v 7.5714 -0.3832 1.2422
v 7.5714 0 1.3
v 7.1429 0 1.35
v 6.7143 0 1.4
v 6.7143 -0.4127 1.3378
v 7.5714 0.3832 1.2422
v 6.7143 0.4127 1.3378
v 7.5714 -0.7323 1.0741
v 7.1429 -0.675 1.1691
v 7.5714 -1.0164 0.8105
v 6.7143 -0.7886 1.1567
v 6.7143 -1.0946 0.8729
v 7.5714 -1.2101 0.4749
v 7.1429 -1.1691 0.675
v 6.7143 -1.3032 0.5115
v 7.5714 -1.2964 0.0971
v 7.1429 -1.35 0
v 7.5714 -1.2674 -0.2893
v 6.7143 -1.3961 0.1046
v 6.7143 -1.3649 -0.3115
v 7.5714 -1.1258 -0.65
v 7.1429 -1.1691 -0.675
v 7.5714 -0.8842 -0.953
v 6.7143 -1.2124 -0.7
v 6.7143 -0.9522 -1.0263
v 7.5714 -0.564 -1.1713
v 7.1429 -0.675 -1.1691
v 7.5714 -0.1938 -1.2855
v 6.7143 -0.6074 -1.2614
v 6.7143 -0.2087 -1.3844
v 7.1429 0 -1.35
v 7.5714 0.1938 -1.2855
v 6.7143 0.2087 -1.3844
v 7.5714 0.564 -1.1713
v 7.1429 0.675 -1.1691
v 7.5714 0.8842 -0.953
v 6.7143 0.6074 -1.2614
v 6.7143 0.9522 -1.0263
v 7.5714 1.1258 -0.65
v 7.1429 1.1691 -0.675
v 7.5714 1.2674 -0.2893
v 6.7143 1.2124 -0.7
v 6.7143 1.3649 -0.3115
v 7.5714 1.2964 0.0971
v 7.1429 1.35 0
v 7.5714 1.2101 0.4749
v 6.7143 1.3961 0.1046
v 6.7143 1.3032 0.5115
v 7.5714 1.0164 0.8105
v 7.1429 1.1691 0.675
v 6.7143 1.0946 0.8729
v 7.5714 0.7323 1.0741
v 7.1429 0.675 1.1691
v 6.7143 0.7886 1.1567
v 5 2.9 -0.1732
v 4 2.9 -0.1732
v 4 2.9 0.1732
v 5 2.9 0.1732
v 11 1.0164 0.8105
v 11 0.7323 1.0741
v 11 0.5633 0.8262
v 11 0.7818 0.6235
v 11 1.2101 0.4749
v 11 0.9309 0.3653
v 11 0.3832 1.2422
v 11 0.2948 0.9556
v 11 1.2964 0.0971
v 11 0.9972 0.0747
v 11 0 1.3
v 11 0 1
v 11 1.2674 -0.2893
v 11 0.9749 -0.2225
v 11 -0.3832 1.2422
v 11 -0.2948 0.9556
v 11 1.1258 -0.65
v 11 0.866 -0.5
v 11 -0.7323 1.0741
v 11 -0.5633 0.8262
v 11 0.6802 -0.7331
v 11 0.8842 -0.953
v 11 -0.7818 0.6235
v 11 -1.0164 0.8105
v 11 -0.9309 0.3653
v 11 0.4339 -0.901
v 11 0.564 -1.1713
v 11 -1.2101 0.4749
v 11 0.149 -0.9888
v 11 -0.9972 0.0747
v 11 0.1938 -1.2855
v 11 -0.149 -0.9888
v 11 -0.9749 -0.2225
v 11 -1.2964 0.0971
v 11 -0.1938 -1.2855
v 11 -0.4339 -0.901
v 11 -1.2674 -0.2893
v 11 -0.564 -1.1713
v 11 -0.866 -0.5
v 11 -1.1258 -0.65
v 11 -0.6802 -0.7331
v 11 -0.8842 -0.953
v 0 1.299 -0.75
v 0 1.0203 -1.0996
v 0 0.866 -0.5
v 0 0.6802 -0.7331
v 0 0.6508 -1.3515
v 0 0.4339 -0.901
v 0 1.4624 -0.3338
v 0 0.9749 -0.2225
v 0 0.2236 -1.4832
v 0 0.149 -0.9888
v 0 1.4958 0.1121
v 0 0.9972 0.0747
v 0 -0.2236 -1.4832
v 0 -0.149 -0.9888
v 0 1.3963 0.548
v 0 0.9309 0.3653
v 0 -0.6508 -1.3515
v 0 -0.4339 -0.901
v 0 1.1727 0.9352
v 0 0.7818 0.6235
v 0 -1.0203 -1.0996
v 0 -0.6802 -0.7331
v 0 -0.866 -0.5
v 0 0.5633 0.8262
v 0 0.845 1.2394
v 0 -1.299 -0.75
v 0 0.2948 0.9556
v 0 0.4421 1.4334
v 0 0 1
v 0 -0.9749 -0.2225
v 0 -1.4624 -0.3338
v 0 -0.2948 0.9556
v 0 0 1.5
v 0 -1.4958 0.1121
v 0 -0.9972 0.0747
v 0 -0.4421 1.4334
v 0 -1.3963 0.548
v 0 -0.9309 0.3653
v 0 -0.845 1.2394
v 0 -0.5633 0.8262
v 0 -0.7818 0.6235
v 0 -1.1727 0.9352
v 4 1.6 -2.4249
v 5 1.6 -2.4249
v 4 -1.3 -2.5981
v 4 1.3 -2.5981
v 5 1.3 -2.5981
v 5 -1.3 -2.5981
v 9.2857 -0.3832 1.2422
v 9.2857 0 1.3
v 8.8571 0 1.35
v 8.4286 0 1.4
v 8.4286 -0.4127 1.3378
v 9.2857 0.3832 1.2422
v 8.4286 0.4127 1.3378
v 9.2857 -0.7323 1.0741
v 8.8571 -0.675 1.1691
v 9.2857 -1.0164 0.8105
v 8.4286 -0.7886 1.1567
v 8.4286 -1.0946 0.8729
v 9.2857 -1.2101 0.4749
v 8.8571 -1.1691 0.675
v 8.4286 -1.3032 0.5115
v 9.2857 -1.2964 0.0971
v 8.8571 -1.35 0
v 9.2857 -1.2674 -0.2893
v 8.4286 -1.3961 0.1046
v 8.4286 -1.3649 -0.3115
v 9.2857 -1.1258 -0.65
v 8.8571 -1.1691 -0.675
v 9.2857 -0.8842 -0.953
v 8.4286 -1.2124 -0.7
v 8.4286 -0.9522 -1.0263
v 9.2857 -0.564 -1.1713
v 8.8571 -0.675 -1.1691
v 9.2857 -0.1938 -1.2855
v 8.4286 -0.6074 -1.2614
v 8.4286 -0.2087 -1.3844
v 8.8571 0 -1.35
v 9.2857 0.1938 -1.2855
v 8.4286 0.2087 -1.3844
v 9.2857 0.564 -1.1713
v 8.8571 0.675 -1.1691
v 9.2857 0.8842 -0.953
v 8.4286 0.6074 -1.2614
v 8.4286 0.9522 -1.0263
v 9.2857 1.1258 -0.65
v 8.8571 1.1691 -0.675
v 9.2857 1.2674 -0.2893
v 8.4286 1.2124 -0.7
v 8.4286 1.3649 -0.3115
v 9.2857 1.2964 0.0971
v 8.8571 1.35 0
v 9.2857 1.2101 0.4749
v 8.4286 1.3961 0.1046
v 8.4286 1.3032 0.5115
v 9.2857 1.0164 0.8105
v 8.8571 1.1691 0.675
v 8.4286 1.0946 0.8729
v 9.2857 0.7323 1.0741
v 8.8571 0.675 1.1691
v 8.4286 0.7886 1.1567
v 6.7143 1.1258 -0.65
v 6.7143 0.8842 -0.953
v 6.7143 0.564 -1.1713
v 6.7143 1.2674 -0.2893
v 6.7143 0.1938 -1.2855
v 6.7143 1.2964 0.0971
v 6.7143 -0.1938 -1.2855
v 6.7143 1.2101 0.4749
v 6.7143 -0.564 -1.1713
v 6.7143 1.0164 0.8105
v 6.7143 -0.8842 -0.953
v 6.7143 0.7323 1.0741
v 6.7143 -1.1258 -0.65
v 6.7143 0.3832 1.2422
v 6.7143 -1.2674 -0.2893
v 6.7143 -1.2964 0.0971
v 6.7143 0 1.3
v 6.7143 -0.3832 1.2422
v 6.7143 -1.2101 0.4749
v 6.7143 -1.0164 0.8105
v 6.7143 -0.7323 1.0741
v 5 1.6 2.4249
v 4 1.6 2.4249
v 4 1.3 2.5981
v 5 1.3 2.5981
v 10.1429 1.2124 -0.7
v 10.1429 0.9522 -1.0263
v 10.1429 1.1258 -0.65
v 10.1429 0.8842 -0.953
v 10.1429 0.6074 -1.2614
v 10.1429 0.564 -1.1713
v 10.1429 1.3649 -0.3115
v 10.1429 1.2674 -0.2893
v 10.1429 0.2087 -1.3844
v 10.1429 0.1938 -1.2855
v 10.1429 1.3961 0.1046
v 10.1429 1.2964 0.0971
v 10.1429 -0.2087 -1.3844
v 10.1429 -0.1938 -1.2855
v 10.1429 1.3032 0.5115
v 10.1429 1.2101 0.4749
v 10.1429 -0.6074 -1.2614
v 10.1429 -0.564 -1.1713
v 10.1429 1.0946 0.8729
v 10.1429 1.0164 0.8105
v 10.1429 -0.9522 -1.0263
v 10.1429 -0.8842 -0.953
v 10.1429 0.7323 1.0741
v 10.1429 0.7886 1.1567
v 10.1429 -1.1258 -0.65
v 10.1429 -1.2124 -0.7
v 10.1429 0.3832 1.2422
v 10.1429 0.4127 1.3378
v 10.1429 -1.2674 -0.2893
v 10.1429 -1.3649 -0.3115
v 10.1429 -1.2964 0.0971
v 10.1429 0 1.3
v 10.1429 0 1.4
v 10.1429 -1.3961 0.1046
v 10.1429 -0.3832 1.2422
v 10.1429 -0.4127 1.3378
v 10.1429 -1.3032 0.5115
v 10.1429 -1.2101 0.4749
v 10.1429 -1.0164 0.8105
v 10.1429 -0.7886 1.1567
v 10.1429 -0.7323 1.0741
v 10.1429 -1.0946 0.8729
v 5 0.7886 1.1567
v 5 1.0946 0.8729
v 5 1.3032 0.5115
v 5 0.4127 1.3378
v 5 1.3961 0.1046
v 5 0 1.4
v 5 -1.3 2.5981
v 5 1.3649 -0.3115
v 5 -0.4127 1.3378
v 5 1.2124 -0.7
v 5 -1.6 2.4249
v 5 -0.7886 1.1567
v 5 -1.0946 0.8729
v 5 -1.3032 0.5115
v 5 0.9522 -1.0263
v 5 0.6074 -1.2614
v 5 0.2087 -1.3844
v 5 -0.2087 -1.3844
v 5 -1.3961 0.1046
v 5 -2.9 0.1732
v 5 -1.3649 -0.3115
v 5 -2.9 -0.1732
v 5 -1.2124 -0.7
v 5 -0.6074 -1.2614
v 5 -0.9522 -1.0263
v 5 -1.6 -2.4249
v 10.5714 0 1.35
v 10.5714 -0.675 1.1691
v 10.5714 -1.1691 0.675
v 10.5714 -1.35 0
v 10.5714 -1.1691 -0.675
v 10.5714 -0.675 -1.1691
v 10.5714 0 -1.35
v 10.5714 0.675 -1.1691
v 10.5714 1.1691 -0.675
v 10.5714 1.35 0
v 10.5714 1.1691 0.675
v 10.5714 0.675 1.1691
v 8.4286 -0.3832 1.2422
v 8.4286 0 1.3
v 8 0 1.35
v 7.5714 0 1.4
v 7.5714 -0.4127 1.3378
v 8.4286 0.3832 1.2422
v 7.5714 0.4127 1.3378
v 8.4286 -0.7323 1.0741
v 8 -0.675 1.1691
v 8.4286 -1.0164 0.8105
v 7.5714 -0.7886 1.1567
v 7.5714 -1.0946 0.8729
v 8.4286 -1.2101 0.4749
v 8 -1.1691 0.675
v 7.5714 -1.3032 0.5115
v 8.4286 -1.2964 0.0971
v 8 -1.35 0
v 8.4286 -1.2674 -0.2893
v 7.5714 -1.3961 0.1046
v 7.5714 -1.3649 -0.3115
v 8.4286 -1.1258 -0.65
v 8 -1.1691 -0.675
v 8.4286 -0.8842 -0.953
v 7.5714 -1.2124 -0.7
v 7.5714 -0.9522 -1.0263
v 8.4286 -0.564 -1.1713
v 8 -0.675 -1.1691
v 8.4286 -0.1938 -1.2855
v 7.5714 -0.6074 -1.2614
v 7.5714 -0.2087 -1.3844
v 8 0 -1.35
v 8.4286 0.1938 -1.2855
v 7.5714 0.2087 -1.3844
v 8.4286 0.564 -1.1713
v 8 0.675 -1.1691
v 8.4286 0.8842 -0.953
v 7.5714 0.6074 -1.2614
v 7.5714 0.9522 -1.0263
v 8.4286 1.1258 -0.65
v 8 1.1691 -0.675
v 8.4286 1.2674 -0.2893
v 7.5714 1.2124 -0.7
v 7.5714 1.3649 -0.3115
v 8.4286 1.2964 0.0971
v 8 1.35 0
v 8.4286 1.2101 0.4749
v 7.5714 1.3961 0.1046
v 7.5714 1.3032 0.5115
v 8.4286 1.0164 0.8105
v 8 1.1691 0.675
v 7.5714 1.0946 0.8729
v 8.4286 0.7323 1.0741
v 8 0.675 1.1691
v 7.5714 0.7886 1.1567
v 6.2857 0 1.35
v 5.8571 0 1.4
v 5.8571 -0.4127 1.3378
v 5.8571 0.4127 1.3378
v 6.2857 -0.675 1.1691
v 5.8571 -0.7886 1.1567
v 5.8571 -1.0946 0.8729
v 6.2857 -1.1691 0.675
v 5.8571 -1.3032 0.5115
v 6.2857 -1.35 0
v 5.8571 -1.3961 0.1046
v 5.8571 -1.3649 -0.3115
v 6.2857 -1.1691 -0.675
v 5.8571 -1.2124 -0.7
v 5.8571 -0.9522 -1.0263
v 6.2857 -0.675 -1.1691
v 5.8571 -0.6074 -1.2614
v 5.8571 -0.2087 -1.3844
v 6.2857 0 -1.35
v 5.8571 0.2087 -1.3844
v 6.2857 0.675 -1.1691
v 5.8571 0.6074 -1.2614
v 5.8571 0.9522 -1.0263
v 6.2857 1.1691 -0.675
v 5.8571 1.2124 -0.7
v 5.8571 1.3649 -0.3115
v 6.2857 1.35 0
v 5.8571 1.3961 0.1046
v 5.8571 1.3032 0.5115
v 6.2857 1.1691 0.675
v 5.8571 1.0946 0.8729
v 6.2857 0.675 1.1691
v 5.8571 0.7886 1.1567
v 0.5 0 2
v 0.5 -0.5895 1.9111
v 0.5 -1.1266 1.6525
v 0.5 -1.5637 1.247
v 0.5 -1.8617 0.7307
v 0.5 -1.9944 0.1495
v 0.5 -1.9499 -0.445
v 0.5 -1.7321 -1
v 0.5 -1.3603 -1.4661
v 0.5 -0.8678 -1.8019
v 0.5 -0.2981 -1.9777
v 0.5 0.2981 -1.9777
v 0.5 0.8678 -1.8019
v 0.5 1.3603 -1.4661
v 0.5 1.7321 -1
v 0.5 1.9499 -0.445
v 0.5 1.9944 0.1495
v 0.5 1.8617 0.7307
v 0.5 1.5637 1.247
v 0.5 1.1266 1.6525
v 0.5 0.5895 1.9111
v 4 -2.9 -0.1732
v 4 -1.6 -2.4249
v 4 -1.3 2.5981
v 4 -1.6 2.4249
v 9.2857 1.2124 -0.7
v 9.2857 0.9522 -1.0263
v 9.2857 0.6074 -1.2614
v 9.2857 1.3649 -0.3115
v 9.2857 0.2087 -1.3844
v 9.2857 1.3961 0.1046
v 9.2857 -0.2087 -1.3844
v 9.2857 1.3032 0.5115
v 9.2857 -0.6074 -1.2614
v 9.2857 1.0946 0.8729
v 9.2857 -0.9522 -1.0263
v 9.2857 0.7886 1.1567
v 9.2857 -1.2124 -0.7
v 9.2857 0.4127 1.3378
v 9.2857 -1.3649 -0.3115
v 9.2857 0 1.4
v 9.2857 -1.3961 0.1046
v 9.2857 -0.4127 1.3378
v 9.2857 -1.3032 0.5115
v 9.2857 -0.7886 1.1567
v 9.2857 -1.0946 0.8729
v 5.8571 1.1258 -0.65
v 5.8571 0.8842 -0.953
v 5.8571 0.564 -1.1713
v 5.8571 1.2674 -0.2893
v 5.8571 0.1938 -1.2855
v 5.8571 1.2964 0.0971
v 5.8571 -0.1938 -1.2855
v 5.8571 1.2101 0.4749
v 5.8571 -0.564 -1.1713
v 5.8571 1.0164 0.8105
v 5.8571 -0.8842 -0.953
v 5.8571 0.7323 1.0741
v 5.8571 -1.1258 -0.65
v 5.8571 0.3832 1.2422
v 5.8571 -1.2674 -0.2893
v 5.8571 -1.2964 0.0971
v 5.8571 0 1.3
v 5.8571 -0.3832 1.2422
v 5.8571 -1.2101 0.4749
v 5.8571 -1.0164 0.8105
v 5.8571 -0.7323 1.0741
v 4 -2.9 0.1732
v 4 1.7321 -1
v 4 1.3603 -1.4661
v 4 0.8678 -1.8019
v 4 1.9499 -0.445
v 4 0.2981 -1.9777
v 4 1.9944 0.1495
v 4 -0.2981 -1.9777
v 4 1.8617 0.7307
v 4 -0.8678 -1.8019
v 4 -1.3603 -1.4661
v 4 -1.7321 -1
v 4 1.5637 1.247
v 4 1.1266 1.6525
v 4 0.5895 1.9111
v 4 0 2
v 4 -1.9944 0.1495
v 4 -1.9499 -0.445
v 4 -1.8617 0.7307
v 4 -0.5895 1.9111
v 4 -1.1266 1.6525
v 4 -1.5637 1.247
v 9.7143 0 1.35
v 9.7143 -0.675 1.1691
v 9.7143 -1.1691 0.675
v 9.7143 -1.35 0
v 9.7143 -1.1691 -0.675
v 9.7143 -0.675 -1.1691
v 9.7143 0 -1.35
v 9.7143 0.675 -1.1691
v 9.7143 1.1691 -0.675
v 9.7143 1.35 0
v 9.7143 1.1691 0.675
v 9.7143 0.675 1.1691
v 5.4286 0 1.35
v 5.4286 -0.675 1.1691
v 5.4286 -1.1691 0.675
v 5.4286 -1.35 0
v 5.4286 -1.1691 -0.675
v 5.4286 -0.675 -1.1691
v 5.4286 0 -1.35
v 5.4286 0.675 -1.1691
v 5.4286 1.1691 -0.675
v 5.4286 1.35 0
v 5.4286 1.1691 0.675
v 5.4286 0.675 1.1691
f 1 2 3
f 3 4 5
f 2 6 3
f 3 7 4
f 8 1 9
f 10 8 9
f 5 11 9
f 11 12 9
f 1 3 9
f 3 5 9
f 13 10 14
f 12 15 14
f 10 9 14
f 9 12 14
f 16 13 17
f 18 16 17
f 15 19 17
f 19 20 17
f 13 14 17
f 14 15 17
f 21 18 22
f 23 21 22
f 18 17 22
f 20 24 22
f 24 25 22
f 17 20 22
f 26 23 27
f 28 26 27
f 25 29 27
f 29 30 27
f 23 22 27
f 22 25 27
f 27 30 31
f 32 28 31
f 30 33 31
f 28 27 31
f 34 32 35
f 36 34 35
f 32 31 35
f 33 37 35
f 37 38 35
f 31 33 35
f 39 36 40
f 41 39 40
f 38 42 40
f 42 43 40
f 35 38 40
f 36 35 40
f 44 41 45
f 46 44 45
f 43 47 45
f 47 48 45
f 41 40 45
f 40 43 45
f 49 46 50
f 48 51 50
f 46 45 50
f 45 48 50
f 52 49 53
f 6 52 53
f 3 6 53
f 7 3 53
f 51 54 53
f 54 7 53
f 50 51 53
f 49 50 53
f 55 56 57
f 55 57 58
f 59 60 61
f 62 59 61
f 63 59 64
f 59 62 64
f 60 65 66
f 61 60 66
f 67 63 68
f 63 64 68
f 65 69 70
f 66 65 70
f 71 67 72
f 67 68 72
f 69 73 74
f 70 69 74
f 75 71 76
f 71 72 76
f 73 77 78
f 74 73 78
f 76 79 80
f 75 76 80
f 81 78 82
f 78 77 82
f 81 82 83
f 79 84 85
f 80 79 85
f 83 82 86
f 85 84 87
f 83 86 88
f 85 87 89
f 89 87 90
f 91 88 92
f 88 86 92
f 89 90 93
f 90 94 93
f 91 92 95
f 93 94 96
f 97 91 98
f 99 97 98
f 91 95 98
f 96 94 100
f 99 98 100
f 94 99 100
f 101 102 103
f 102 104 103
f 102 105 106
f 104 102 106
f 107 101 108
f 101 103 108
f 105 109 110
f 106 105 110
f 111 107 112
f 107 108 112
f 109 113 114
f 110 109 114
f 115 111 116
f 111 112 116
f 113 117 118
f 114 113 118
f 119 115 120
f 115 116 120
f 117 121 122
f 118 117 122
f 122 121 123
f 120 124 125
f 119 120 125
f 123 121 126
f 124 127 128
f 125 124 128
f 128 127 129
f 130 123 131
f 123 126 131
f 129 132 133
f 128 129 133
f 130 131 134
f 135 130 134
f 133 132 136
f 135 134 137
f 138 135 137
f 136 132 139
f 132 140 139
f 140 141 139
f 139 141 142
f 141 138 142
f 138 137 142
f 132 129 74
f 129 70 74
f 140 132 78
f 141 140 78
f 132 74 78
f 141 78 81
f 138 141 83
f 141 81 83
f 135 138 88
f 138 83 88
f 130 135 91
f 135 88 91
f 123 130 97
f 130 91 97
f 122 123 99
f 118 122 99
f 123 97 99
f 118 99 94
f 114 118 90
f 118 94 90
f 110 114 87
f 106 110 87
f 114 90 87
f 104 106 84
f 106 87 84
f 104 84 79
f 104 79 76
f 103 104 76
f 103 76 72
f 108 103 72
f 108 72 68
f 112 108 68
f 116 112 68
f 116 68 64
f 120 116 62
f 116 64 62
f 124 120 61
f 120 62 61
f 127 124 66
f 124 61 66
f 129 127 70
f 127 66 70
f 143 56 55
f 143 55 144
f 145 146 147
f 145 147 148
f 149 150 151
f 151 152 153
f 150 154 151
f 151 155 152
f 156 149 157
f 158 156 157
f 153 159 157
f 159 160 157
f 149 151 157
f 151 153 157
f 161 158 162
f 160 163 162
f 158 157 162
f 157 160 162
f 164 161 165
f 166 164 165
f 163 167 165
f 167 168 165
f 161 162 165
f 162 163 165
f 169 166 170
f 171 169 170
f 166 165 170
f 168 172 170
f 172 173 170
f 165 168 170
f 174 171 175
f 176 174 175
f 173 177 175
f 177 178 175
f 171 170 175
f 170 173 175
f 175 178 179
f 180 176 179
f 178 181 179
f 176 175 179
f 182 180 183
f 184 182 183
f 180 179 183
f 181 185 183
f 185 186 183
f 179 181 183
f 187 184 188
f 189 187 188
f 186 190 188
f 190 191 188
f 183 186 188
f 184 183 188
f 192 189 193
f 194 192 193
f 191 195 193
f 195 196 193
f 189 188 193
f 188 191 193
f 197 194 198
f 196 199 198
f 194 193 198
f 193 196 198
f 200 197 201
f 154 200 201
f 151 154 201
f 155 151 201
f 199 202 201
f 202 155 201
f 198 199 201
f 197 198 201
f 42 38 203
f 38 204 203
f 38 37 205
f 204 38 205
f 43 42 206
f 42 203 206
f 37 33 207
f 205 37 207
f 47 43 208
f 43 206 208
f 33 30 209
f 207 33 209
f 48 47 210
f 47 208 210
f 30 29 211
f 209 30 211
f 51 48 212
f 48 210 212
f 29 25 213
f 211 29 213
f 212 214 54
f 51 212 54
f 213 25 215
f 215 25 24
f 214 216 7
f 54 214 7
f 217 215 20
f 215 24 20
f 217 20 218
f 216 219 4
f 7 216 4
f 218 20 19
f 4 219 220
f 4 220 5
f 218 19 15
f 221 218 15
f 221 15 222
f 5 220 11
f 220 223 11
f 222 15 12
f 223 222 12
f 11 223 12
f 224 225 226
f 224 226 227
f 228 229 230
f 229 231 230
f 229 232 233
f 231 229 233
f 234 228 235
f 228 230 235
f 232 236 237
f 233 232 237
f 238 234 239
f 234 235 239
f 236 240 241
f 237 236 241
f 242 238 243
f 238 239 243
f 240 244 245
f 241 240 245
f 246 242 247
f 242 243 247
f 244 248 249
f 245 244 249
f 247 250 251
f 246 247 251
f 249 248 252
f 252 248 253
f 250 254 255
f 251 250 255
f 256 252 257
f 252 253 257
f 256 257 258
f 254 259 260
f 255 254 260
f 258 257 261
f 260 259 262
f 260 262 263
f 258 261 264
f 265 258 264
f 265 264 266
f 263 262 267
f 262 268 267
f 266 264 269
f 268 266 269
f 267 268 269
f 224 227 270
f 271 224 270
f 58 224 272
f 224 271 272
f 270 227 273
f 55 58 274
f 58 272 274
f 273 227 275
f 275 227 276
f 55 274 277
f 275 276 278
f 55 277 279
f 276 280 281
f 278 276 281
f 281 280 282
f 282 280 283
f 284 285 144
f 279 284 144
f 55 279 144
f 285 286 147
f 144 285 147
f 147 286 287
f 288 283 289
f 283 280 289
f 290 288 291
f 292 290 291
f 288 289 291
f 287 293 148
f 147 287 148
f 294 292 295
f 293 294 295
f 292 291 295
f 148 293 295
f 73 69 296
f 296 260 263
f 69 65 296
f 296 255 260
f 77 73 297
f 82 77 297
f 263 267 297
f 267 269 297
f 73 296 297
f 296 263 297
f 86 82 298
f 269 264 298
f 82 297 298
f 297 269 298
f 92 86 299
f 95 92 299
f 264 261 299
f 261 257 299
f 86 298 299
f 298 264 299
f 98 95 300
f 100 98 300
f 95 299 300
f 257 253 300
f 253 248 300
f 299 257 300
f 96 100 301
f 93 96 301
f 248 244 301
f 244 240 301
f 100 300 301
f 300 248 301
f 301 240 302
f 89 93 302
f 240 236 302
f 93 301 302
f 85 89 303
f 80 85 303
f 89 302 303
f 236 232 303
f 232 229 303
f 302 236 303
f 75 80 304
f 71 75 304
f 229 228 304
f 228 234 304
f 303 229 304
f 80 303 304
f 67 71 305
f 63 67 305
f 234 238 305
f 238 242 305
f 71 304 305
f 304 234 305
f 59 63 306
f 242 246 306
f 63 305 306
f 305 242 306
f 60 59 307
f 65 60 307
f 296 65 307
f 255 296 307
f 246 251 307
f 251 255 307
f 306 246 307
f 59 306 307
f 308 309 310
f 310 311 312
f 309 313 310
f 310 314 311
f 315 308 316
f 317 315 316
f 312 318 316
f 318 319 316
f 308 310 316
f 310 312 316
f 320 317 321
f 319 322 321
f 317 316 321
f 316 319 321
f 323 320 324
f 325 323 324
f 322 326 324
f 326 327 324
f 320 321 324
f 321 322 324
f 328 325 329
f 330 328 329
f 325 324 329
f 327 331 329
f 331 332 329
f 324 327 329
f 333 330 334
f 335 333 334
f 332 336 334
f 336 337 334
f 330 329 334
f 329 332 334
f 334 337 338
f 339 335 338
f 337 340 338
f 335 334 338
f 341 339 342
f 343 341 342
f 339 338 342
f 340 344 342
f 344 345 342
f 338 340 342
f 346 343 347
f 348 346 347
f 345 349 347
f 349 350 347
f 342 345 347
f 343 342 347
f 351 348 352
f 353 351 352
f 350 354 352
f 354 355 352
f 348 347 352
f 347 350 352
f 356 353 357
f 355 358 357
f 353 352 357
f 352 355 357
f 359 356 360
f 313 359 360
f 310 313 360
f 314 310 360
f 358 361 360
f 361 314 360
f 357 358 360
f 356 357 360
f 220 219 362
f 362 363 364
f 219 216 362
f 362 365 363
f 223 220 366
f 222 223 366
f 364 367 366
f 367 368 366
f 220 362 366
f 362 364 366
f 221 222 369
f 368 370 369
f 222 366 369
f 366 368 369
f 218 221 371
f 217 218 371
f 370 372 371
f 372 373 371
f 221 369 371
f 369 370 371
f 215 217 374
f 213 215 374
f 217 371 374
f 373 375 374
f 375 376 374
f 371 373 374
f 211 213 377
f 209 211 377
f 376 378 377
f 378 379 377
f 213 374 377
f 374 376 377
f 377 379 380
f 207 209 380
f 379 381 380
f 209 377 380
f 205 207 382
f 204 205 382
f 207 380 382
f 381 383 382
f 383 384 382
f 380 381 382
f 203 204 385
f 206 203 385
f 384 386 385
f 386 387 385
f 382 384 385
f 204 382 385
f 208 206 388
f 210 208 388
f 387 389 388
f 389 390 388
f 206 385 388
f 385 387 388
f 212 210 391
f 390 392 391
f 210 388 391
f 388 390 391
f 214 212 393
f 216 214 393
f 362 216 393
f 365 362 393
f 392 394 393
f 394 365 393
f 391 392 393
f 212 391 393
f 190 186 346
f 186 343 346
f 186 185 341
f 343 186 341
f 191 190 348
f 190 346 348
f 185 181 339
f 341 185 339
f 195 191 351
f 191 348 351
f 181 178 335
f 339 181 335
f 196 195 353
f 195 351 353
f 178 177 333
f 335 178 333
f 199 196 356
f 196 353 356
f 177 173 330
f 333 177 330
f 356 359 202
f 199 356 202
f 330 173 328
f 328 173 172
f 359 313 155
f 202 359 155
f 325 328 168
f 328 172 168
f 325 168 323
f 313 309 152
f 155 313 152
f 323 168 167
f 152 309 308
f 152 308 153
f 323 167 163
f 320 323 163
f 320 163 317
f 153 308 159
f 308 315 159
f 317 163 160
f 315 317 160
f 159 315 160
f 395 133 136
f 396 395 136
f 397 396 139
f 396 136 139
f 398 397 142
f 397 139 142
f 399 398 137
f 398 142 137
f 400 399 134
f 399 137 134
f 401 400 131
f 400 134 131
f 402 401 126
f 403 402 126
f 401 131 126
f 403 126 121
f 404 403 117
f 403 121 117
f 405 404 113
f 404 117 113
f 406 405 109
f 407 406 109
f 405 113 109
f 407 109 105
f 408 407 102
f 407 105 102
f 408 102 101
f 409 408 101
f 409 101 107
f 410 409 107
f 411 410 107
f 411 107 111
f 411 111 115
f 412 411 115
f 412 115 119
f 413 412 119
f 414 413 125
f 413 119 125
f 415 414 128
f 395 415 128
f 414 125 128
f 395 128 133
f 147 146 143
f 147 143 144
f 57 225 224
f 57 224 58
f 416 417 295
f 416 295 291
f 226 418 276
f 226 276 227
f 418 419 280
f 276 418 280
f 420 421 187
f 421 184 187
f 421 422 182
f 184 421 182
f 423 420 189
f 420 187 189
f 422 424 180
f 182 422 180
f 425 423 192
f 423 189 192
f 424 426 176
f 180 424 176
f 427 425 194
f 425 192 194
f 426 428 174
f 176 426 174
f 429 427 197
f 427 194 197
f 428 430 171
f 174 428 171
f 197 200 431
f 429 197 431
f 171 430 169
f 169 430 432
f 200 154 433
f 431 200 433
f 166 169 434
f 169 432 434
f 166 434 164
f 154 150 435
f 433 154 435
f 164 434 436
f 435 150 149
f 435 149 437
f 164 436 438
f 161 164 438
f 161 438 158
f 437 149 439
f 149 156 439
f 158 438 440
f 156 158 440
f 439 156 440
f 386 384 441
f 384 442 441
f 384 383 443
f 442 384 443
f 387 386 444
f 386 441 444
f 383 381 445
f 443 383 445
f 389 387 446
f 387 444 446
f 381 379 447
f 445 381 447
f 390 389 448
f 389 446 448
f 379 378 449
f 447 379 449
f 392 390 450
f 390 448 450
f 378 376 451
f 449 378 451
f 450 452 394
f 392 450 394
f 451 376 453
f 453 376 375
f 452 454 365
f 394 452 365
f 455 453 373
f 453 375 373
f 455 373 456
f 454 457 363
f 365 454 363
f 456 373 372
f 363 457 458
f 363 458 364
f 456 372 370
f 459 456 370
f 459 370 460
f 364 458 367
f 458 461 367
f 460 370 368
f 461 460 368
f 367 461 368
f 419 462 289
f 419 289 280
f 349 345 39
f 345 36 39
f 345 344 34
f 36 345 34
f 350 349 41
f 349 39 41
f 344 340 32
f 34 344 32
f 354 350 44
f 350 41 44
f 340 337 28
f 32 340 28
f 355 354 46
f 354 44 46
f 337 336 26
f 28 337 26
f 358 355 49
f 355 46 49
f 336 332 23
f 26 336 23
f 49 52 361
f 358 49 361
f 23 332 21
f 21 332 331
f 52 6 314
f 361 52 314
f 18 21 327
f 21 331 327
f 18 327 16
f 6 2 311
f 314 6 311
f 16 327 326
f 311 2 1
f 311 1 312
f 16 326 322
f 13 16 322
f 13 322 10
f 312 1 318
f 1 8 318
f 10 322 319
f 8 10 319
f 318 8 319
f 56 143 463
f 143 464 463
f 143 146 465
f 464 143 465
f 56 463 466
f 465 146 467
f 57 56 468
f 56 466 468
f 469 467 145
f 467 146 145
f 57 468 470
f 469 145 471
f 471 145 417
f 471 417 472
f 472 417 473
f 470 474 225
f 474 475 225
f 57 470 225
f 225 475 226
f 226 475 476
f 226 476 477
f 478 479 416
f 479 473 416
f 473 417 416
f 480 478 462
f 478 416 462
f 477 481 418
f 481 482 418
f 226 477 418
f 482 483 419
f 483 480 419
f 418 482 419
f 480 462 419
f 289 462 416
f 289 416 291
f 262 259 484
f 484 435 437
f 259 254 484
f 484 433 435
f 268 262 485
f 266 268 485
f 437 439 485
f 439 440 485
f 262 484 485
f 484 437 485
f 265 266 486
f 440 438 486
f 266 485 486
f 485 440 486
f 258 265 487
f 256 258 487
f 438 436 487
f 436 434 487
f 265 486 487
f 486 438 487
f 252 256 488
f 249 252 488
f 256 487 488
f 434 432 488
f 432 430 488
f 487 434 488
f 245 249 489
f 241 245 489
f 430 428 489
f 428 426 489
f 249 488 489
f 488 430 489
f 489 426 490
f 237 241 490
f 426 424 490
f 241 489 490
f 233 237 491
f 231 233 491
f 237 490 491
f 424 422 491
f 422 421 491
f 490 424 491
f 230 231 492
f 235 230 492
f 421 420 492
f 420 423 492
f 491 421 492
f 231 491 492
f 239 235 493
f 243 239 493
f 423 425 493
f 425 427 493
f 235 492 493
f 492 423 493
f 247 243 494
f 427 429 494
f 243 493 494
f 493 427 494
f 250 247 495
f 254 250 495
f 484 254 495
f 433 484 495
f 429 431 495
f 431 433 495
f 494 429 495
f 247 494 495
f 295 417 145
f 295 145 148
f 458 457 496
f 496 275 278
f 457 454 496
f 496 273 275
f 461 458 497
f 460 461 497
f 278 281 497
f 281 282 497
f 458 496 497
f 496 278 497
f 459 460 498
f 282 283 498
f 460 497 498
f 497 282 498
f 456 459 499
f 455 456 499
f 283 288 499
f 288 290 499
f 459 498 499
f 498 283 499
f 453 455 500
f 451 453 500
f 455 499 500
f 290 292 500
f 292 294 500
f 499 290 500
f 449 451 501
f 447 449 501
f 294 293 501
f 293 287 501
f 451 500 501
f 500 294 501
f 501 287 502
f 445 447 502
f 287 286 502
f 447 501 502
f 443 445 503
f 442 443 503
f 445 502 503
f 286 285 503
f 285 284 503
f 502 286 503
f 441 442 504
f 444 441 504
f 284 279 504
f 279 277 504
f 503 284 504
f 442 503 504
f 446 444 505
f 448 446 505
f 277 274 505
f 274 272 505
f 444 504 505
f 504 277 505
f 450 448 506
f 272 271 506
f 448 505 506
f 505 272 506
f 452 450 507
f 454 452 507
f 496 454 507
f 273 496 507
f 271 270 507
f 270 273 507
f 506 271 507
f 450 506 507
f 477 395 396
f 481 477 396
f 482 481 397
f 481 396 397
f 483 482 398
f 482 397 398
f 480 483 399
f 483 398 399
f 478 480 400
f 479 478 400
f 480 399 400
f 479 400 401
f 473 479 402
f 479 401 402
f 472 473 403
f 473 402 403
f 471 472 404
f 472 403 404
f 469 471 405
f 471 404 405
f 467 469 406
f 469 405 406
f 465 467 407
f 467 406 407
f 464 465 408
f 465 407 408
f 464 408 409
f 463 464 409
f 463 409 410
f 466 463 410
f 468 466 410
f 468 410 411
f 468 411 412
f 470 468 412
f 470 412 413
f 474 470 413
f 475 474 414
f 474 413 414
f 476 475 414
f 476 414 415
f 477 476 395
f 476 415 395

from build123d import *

# Parameters (mm, degrees)
CHAMFER1_SIZE      = 0.5
SKETCH2_R          = 6
CUT_EXTRUDE2_DEPTH = 9.185352772
CHAMFER2_SIZE      = 0.2


with BuildPart() as part:
    # Sketch1 → Revolve1 (revolve)
    with BuildSketch(Plane.XY, mode=Mode.PRIVATE) as revolve1_sk:
        Polygon((0, 1), (11, 1), (11, 1.3), (10.142857143, 1.4), (10.142857143, 1.3), (9.285714286, 1.4), (9.285714286, 1.3), (8.428571429, 1.4), (8.428571429, 1.3), (7.571428571, 1.4), (7.571428571, 1.3), (6.714285714, 1.4), (6.714285714, 1.3), (5.857142857, 1.4), (5.857142857, 1.3), (5, 1.4), (5, 3), (4, 3), (4, 2), (0, 2), align=None)
    revolve(revolve1_sk.sketch.rotate(Axis((0, 0, 0), (1, 0, 0)), 90), axis=Axis((0, 0, 0), (1, 0, 0)))

    # Chamfer1
    chamfer1_edges = [part.edges().sort_by_distance(p)[0] for p in [
        (0, 0, -2),
    ]]
    chamfer(chamfer1_edges, length=CHAMFER1_SIZE)

    # Sketch2 → Cut-Extrude2 (cut, through all)
    with BuildSketch(Plane.ZY.offset(-4)):
        Circle(SKETCH2_R)
        Polygon((0, 3), (-2.598076211, 1.5), (-2.598076211, -1.5), (0, -3), (2.598076211, -1.5), (2.598076211, 1.5), align=None, mode=Mode.SUBTRACT)
    extrude(amount=-CUT_EXTRUDE2_DEPTH, mode=Mode.SUBTRACT)

    # Chamfer2
    chamfer2_edges = [part.edges().sort_by_distance(p)[0] for p in [
        (4.5, 1.5, 2.598076211),
        (4.5, -1.5, 2.598076211),
        (4.5, -3, 0),
        (4.5, -1.5, -2.598076211),
        (4.5, 1.5, -2.598076211),
        (4.5, 3, 0),
    ]]
    chamfer(chamfer2_edges, length=CHAMFER2_SIZE)


solid = part.part
